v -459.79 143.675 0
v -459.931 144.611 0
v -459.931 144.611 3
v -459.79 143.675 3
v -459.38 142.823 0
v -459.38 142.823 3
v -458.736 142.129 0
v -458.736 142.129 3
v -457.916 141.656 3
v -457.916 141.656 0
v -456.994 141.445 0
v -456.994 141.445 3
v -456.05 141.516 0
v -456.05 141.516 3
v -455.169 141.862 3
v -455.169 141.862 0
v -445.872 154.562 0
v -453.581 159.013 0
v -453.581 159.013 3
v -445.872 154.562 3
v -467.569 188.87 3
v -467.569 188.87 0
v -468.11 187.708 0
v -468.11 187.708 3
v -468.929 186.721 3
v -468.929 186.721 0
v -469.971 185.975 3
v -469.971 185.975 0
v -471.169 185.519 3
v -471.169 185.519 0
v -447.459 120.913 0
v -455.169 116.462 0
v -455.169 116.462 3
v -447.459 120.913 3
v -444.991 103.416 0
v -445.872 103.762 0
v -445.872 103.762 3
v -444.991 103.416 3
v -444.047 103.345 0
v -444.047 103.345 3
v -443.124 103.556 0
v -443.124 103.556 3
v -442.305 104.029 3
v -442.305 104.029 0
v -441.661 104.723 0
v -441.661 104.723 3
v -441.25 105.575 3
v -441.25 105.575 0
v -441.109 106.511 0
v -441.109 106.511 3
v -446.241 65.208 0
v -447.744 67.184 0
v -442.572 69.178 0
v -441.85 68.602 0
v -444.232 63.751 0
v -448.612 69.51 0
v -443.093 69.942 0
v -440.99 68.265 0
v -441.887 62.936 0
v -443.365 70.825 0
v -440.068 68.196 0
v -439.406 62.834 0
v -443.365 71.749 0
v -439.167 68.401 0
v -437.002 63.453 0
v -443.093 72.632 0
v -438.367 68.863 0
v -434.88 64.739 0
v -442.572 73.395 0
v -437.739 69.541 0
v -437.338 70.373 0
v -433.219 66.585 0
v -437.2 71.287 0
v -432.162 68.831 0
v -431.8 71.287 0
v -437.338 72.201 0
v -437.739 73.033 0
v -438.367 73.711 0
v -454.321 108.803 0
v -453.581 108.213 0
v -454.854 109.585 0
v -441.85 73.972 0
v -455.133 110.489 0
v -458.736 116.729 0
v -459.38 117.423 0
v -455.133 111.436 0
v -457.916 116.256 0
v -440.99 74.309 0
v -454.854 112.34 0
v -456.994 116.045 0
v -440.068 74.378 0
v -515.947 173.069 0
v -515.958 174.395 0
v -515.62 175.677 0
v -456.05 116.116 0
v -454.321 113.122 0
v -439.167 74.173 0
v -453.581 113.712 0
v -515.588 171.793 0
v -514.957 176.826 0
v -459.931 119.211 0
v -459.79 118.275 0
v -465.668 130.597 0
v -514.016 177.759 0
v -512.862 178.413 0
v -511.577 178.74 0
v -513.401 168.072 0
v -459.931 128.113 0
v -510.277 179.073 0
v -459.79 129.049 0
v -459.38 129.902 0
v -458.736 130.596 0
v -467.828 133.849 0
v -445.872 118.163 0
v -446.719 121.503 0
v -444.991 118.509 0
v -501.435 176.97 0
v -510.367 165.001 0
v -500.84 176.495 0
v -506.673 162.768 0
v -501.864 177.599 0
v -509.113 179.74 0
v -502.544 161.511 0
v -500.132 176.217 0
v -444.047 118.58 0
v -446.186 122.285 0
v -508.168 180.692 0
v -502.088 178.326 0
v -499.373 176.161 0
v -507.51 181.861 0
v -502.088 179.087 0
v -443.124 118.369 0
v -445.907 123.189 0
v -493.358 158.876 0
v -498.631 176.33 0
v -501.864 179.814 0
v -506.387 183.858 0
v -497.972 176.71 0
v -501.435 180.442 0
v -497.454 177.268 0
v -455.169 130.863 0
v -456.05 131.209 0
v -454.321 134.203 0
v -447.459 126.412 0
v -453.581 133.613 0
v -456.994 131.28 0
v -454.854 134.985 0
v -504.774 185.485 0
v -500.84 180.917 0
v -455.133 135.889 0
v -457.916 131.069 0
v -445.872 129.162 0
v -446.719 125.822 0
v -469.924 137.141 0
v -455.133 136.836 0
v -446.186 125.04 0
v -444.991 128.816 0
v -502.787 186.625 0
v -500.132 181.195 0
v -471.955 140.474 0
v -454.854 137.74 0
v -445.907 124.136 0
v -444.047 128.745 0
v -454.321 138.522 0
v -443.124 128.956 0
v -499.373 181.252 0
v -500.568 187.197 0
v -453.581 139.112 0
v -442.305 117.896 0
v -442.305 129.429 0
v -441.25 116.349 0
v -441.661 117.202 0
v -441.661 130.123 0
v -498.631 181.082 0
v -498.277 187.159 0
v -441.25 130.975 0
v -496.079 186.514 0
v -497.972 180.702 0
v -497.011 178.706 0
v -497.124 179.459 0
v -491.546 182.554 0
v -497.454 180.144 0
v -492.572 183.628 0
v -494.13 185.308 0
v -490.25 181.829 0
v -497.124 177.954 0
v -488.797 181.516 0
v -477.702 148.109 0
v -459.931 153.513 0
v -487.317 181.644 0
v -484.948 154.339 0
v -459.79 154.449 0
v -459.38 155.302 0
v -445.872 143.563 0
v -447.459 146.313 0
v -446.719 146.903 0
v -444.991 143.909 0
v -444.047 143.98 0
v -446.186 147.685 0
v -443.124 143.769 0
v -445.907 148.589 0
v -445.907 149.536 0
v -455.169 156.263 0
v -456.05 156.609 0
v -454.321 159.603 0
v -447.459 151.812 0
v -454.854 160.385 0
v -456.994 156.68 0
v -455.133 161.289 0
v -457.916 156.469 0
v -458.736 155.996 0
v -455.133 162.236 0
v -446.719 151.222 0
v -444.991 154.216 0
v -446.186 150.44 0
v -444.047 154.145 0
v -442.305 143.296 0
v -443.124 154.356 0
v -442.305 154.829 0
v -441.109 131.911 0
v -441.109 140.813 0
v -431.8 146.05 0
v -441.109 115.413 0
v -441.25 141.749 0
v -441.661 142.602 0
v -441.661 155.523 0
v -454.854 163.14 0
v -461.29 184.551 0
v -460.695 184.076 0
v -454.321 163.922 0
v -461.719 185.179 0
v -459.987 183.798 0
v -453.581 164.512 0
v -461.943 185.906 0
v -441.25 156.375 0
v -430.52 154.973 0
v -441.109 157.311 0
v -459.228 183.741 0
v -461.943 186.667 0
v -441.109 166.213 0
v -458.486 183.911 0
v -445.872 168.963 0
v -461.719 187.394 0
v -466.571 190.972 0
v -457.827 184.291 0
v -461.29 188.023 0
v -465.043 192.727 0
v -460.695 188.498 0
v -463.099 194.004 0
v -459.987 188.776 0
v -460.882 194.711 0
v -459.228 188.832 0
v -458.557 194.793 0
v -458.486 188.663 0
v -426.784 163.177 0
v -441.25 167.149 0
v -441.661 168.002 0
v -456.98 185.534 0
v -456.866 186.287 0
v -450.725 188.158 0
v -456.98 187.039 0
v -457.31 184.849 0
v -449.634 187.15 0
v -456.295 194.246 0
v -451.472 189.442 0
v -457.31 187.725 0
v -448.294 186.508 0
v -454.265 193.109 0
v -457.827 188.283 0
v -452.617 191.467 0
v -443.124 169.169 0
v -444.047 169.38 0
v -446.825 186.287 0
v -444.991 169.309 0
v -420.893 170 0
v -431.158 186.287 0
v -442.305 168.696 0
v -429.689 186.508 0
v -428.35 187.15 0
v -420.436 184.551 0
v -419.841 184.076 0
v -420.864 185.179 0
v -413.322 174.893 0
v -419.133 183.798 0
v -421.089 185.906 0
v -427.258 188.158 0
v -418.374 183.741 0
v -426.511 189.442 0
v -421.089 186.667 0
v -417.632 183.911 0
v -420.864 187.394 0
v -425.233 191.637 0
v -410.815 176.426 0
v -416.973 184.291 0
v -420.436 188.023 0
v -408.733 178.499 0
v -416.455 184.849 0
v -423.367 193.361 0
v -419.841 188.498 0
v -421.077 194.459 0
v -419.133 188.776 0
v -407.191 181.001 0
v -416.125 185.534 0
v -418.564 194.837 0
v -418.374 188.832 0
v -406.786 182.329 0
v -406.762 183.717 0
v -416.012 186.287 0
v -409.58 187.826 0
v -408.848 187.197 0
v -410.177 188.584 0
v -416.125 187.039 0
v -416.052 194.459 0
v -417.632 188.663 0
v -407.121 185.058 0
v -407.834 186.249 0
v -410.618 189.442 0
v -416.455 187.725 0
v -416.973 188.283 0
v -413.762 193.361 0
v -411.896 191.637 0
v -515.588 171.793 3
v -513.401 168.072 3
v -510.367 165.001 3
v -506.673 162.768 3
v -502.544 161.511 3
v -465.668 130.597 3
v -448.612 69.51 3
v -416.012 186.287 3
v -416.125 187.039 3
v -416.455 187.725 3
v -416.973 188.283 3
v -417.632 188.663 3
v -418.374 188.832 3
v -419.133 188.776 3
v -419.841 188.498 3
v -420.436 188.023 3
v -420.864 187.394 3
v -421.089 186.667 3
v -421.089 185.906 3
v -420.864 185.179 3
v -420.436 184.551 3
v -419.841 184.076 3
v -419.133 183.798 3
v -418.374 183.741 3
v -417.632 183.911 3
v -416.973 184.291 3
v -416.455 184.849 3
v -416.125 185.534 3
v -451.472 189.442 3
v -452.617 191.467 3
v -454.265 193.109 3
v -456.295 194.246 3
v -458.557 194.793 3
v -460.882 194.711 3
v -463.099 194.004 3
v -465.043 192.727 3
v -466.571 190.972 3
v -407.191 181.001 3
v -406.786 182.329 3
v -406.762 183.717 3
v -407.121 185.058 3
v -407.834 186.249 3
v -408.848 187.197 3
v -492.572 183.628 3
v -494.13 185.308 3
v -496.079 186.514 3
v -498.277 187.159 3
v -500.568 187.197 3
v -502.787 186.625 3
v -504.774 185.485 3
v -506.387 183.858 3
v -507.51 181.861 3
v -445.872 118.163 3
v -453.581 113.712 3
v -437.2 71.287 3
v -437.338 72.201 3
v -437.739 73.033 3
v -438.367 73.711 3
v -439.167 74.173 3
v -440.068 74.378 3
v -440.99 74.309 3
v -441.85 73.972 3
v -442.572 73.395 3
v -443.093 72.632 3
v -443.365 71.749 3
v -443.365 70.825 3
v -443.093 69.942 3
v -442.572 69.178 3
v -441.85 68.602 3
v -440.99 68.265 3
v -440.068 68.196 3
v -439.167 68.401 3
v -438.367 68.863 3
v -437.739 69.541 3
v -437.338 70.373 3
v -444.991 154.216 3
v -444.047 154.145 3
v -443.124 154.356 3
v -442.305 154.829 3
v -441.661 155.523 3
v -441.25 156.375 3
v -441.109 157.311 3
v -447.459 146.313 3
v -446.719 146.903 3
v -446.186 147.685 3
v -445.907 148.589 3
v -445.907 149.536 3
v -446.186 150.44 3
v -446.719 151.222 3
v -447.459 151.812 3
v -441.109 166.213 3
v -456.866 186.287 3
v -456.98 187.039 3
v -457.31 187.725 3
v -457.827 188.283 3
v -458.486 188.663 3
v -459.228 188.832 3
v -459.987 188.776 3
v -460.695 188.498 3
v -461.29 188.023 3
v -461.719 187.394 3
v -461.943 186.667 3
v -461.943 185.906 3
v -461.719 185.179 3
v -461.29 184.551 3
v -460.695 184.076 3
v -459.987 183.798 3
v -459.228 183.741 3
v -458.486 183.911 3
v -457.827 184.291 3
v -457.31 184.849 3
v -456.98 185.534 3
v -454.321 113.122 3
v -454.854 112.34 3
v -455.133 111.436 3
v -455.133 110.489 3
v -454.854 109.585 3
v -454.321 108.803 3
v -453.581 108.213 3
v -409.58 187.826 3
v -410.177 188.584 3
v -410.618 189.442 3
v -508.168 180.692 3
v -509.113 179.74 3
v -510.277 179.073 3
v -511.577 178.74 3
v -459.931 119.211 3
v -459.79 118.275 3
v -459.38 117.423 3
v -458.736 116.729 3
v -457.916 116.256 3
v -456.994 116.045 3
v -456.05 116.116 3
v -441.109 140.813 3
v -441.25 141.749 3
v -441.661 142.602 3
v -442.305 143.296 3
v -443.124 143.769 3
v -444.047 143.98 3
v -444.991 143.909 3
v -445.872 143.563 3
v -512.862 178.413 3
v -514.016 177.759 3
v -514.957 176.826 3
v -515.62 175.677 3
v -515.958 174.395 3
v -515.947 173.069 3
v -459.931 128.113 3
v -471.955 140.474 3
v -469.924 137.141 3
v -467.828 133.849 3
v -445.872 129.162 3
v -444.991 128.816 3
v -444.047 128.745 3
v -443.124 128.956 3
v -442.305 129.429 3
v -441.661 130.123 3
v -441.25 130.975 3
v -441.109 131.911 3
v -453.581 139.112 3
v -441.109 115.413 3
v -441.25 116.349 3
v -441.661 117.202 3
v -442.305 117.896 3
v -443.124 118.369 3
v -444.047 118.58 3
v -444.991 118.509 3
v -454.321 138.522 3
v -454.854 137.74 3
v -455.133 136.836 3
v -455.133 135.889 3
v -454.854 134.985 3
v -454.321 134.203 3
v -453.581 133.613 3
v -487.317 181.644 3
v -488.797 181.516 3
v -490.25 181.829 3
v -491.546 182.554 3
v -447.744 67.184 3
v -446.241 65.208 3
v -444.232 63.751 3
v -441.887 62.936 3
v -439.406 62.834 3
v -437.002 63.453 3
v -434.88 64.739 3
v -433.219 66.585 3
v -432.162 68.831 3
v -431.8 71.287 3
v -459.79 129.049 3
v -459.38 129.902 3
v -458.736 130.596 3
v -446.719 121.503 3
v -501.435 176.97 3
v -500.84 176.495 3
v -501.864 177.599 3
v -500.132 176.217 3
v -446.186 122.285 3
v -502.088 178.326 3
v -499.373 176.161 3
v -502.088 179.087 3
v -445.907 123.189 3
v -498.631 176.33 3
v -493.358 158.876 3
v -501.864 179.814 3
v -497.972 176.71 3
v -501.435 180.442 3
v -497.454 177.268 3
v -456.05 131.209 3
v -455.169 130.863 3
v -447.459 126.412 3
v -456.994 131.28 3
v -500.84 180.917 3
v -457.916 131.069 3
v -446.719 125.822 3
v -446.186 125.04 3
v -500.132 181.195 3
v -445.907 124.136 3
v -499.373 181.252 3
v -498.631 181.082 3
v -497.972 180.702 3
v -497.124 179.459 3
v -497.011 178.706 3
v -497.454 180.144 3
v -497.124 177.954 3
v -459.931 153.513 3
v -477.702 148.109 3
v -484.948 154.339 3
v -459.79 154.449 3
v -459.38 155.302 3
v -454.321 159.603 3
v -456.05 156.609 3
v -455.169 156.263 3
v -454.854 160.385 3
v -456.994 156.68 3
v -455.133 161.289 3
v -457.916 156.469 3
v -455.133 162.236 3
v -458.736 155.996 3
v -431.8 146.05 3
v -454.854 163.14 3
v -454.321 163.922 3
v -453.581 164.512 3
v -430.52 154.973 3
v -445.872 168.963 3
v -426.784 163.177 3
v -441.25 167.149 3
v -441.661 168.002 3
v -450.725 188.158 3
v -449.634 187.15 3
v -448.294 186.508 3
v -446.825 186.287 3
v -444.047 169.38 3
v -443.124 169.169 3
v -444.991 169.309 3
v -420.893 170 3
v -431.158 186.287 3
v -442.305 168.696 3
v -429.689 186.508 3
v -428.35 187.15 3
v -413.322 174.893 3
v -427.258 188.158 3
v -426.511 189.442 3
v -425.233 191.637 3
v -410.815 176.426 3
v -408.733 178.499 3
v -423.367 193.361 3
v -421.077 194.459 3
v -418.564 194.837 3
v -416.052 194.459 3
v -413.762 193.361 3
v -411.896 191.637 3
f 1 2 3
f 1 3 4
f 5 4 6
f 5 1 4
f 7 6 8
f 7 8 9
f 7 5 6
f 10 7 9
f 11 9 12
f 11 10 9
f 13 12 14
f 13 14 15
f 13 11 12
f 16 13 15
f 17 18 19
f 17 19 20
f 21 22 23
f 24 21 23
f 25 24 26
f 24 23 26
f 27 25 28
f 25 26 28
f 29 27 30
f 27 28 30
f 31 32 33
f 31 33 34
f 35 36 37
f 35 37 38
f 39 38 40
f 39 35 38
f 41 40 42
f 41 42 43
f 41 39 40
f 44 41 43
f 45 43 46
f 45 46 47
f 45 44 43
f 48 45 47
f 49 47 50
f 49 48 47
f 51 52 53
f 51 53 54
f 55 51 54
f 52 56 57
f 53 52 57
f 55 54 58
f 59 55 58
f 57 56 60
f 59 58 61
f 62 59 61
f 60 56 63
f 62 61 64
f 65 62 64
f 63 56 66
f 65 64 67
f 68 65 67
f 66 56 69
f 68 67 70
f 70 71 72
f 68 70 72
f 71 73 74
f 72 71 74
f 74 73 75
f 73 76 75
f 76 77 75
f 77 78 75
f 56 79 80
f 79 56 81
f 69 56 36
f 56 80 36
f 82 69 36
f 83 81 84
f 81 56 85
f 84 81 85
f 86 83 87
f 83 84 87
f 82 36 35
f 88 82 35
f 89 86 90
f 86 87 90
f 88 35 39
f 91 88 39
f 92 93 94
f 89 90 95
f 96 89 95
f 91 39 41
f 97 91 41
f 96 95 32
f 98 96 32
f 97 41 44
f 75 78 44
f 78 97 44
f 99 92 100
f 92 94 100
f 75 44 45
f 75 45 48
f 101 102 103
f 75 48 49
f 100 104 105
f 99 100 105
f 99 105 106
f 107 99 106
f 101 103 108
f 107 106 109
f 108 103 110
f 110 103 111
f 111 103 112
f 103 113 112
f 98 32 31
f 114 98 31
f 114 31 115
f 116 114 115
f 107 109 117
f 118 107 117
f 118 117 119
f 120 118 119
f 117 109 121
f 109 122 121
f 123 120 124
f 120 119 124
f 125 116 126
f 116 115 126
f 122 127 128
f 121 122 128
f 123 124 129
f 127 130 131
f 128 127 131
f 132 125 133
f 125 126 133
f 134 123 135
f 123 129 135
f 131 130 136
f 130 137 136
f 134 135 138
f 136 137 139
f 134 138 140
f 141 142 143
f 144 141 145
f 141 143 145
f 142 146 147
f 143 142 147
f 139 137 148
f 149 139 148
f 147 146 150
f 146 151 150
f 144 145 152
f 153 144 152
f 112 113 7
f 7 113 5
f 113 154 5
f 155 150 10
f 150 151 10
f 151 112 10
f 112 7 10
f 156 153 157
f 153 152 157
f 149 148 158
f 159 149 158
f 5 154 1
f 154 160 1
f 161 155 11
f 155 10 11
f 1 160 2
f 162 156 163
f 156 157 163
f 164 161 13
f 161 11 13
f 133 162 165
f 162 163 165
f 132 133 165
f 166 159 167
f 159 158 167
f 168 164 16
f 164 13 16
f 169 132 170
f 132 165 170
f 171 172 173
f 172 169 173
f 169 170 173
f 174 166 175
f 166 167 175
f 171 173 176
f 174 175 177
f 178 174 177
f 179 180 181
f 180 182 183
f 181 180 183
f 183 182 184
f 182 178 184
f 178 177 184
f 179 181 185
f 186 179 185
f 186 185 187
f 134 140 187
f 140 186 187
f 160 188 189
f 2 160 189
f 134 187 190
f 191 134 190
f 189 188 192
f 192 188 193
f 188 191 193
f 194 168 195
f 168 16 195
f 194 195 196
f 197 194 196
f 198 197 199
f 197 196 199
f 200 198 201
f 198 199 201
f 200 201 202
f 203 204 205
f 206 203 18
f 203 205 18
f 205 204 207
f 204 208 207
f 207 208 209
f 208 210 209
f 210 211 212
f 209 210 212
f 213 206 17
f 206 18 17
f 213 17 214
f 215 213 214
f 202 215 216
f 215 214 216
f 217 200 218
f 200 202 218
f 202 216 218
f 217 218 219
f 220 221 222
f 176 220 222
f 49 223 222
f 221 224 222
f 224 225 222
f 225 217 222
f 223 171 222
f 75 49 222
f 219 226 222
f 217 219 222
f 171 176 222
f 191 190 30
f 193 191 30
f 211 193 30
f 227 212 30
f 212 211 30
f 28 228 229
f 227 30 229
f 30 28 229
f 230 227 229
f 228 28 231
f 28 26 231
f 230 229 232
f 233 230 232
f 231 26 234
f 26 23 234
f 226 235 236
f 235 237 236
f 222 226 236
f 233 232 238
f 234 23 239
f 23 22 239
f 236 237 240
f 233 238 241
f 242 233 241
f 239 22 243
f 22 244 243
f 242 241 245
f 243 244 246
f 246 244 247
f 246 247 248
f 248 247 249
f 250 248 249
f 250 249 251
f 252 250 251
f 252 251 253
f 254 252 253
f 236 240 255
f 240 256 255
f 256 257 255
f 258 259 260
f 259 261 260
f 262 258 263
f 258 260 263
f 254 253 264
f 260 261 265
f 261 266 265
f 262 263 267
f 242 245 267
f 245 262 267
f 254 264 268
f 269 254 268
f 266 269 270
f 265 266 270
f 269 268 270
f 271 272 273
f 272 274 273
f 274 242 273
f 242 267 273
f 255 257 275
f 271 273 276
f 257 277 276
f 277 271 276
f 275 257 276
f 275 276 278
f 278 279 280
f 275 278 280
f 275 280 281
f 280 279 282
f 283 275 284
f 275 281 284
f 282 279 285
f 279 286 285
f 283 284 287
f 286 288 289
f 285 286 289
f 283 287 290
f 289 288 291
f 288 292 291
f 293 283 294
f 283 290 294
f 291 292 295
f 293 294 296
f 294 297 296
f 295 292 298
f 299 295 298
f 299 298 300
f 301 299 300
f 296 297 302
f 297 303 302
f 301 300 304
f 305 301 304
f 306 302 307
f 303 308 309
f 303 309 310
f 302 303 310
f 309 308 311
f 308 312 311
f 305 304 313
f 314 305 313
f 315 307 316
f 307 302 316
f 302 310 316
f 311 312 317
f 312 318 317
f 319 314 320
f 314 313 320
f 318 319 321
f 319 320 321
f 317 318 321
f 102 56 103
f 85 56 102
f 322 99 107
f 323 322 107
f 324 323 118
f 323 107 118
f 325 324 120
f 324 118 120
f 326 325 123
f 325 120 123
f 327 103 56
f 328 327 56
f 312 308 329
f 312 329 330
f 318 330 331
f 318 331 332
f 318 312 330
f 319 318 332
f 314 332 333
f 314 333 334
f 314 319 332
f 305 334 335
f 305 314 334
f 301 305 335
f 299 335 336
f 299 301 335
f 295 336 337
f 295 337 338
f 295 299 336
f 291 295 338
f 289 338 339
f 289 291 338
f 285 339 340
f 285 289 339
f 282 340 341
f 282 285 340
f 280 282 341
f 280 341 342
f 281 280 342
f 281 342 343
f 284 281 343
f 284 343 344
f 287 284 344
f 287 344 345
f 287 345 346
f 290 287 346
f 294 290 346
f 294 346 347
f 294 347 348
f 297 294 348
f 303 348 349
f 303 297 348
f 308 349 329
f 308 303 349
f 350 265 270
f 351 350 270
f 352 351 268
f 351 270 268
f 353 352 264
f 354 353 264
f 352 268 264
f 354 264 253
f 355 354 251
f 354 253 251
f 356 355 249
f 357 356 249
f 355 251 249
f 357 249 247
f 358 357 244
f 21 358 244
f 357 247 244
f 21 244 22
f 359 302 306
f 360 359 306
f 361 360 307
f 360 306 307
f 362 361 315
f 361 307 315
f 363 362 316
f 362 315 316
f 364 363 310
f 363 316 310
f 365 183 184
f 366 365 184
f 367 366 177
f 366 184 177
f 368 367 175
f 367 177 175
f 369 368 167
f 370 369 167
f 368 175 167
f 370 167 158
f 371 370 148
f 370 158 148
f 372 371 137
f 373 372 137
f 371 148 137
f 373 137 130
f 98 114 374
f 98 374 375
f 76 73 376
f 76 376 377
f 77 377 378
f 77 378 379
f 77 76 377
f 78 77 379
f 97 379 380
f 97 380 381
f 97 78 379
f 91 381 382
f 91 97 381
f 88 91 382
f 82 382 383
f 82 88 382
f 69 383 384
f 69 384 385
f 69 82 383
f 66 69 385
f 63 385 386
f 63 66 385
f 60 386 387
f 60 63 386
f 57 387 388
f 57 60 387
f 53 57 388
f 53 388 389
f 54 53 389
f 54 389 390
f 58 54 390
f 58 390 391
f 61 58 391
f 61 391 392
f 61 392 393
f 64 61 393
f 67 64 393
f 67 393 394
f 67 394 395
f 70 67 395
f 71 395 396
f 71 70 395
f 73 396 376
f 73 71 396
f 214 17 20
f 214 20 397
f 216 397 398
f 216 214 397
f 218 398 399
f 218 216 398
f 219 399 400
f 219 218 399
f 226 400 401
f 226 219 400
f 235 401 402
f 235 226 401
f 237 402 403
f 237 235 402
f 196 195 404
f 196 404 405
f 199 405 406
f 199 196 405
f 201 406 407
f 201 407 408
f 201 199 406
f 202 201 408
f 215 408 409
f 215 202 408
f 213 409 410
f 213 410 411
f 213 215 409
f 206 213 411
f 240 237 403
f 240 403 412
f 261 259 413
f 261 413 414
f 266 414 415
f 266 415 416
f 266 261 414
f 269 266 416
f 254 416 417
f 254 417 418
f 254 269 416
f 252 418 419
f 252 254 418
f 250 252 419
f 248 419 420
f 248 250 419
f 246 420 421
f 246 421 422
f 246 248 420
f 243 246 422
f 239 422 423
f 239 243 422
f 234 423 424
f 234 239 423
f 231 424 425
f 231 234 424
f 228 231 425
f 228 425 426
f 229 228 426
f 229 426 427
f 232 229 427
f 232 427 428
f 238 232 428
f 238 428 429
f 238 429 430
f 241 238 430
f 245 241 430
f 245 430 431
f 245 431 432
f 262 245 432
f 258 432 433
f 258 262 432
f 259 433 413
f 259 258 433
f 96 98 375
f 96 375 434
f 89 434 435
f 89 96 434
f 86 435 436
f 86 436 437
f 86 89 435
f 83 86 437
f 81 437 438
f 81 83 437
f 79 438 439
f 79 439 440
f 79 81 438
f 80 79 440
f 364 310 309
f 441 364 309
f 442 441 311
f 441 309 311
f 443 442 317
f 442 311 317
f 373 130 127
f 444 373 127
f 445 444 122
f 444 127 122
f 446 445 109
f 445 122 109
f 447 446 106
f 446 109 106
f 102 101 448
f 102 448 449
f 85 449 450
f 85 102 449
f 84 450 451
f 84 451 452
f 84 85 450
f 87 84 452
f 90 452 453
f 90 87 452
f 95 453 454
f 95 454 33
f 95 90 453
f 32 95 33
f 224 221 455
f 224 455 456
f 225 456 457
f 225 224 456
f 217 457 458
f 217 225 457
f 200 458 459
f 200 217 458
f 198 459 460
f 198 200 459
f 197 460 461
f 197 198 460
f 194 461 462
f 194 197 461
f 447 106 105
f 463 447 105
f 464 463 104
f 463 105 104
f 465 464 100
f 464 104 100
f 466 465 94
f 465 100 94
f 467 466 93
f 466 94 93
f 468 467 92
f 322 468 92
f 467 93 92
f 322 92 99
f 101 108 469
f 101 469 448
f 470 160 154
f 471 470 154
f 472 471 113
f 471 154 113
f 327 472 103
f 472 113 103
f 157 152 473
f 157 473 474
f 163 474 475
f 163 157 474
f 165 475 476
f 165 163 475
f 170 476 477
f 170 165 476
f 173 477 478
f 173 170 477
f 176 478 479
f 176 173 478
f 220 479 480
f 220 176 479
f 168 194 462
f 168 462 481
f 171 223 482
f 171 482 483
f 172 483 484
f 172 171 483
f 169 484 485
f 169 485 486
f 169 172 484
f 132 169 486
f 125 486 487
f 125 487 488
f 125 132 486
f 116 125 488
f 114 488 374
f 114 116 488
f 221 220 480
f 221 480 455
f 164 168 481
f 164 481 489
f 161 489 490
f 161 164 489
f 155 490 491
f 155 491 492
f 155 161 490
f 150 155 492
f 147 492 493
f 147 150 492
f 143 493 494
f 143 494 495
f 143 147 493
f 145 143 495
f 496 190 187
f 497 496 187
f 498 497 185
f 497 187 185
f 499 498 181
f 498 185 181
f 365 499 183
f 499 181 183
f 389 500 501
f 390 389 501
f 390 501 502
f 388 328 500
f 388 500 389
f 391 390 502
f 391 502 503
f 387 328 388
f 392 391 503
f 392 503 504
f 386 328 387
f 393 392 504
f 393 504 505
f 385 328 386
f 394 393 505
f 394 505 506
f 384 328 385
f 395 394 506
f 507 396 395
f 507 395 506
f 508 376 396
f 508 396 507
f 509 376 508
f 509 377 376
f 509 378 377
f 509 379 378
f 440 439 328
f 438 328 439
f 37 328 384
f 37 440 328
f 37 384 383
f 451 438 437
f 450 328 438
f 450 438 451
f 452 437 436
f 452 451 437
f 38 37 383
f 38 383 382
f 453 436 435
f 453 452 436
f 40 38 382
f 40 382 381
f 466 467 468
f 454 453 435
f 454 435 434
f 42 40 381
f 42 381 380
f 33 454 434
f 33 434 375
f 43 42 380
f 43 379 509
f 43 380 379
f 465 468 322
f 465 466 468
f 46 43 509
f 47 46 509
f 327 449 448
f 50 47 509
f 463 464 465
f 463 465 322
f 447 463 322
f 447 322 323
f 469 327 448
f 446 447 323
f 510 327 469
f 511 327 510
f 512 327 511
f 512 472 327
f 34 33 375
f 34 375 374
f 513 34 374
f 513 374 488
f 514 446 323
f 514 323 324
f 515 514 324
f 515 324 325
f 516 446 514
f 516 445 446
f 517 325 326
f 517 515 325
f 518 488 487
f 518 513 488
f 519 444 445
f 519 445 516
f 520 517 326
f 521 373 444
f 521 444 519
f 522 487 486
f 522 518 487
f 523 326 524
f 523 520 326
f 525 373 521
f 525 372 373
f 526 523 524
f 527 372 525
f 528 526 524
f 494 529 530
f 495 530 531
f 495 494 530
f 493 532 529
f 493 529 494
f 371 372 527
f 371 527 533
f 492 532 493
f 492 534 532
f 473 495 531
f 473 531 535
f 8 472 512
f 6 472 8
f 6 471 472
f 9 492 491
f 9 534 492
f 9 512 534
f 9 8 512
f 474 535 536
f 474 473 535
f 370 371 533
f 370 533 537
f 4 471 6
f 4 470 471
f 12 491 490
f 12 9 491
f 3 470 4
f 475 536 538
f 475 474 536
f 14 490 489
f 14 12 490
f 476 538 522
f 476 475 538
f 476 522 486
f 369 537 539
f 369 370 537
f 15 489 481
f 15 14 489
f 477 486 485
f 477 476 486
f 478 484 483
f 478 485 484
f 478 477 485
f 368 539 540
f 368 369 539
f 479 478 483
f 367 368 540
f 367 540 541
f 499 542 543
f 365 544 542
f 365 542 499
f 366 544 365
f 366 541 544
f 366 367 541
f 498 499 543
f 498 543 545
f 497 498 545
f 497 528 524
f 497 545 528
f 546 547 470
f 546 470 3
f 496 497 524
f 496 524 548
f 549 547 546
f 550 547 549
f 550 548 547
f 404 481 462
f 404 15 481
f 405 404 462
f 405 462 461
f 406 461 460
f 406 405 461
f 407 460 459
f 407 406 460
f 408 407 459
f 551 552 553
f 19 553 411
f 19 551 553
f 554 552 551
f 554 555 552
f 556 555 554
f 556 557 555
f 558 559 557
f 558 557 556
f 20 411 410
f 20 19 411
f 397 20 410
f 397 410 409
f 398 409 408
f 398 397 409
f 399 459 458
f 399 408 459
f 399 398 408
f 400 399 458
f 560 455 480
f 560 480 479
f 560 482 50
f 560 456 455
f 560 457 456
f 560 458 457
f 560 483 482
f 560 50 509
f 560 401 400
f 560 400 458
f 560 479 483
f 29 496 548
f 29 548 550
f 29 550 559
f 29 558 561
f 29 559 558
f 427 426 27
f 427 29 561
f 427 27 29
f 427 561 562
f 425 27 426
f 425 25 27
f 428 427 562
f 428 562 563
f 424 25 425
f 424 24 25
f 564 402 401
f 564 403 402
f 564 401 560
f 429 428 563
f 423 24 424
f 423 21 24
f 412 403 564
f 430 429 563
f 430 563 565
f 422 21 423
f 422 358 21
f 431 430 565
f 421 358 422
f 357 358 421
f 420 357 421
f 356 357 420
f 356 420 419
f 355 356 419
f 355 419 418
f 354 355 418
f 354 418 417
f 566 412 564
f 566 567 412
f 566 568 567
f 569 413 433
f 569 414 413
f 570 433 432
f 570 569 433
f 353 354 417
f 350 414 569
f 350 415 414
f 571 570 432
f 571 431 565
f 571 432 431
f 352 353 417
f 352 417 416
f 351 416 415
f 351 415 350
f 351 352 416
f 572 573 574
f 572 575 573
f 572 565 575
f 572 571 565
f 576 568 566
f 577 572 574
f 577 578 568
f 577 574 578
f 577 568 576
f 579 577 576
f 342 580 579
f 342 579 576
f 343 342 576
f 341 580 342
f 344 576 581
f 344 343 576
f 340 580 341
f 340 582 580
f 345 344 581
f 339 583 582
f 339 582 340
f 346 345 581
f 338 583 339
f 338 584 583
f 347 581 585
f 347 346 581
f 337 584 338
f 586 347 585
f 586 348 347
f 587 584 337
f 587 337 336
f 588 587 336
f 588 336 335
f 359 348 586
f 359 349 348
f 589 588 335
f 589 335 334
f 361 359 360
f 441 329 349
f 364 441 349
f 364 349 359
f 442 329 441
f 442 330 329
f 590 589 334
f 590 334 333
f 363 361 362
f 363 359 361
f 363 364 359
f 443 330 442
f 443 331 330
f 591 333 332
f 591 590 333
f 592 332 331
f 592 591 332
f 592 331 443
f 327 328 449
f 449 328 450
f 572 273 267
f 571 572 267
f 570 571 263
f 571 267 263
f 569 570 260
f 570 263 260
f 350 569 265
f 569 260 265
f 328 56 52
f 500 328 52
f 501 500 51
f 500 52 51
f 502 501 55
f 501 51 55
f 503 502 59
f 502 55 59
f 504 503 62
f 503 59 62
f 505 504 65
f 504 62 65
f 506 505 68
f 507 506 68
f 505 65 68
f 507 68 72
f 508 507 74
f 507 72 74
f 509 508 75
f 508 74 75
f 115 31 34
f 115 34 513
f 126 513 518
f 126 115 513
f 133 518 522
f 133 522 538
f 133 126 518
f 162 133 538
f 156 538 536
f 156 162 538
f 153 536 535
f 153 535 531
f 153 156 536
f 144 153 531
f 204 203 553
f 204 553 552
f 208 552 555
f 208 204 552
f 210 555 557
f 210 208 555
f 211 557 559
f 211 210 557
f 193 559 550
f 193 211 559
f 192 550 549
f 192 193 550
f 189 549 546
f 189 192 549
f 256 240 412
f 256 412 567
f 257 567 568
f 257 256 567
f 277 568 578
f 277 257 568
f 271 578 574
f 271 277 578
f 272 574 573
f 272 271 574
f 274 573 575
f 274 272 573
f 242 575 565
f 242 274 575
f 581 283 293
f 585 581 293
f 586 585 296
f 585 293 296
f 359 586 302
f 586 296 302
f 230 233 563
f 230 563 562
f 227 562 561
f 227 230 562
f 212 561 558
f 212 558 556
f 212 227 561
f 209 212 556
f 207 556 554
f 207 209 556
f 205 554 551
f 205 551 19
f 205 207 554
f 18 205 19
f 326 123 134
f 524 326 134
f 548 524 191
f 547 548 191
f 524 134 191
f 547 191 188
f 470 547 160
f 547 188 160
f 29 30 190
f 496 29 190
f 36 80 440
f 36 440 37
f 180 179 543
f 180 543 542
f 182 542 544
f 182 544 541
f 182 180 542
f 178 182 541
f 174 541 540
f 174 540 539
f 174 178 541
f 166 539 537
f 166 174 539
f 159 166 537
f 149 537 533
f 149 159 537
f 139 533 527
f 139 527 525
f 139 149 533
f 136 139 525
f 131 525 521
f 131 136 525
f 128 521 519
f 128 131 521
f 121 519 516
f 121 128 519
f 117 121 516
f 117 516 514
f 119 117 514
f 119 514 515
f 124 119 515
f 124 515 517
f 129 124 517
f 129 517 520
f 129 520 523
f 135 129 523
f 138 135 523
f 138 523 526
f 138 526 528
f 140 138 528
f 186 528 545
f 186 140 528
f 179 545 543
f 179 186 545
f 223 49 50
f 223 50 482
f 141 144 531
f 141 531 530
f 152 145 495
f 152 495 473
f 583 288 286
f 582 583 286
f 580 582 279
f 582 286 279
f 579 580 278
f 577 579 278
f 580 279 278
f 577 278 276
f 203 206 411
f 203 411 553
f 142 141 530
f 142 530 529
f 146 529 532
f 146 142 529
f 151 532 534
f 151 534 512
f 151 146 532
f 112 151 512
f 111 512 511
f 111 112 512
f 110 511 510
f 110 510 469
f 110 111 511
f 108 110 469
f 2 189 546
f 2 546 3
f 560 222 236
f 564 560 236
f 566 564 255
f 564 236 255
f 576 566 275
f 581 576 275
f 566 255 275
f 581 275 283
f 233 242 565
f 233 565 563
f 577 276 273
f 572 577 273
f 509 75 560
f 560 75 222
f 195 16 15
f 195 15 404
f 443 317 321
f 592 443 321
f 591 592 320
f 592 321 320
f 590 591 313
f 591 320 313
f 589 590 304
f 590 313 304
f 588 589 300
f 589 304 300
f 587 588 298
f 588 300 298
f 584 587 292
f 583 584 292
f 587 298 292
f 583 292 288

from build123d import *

# Parameters (mm, degrees)
SKETCH_1_R      = 2.5527
SKETCH_1_R_2    = 3.1
EXTRUDE_1_DEPTH = 3


with BuildPart() as part:
    # 草图1 → 凸台-拉伸1 (new body)
    with BuildSketch(Plane.XY):
        with BuildLine():
            Line((-431.8, 71.28685299), (-431.8, 146.05))
            ThreePointArc((-431.8, 146.05), (-426.7842688, 163.177211441), (-413.321803354, 174.893053509))
            ThreePointArc((-413.321803354, 174.893053509), (-409.712819047, 177.401355972), (-407.190786251, 181.000758638))
            ThreePointArc((-407.190786251, 181.000758638), (-406.894729782, 184.399778985), (-408.847840186, 187.197340155))
            ThreePointArc((-408.847840186, 187.197340155), (-409.896638803, 188.190326933), (-410.617854885, 189.441665672))
            ThreePointArc((-410.617854885, 189.441665672), (-418.564439883, 194.83685299), (-426.511139528, 189.44183454))
            ThreePointArc((-426.511139528, 189.44183454), (-428.349818055, 187.150121657), (-431.158279177, 186.28685299))
            Line((-431.158279177, 186.28685299), (-446.825059534, 186.28685299))
            ThreePointArc((-446.825059534, 186.28685299), (-449.633520657, 187.150121657), (-451.472199184, 189.44183454))
            ThreePointArc((-451.472199184, 189.44183454), (-459.722204594, 194.831468283), (-467.569172219, 188.870273751))
            ThreePointArc((-467.569172219, 188.870273751), (-468.928502541, 186.721457004), (-471.168900107, 185.519038159))
            Line((-471.168900107, 185.519038159), (-487.317425816, 181.644437971))
            ThreePointArc((-487.317425816, 181.644437971), (-490.249790032, 181.828630192), (-492.572411279, 183.628107117))
            ThreePointArc((-492.572411279, 183.628107117), (-500.567975463, 187.196951214), (-507.510215673, 181.861129284))
            ThreePointArc((-507.510215673, 181.861129284), (-509.113143283, 179.739691752), (-511.576958731, 178.739948001))
            ThreePointArc((-511.576958731, 178.739948001), (-515.326736937, 176.273665509), (-515.587539859, 171.793111105))
            ThreePointArc((-515.587539859, 171.793111105), (-510.367432741, 165.000898725), (-502.544116189, 161.511001094))
            ThreePointArc((-502.544116189, 161.511001094), (-484.948131906, 154.339092671), (-471.954869788, 140.474386658))
            ThreePointArc((-471.954869788, 140.474386658), (-468.883733752, 135.489867956), (-465.668015362, 130.59737795))
            Line((-465.668015362, 130.59737795), (-448.612101008, 69.509501917))
            ThreePointArc((-448.612101008, 69.509501917), (-439.40637216, 62.833958262), (-431.8, 71.28685299))
        make_face()
        with Locations((-459.418807983, 186.28685299)):
            Circle(SKETCH_1_R, mode=Mode.SUBTRACT)
        with Locations((-418.564530728, 186.28685299)):
            Circle(SKETCH_1_R, mode=Mode.SUBTRACT)
        with Locations((-499.563606874, 178.706147734)):
            Circle(SKETCH_1_R, mode=Mode.SUBTRACT)
        with Locations((-440.3, 71.28685299)):
            Circle(SKETCH_1_R_2, mode=Mode.SUBTRACT)
        with BuildLine():
            Line((-441.1092355, 106.511213318), (-441.1092355, 115.413429376))
            ThreePointArc((-441.1092355, 115.413429376), (-442.6967355, 118.163060033), (-445.8717355, 118.163060033))
            Line((-445.8717355, 118.163060033), (-453.581280756, 113.711952004))
            ThreePointArc((-453.581280756, 113.711952004), (-455.168780756, 110.962321347), (-453.581280756, 108.21269069))
            Line((-453.581280756, 108.21269069), (-445.8717355, 103.761582661))
            ThreePointArc((-445.8717355, 103.761582661), (-442.6967355, 103.761582661), (-441.1092355, 106.511213318))
        make_face(mode=Mode.SUBTRACT)
        with BuildLine():
            Line((-455.168781337, 116.461582661), (-447.459236081, 120.91269069))
            ThreePointArc((-447.459236081, 120.91269069), (-445.871736081, 123.662321347), (-447.459236081, 126.411952004))
            Line((-447.459236081, 126.411952004), (-455.168781337, 130.863060033))
            ThreePointArc((-455.168781337, 130.863060033), (-458.343781337, 130.863060033), (-459.931281337, 128.113429376))
            Line((-459.931281337, 128.113429376), (-459.931281337, 119.211213318))
            ThreePointArc((-459.931281337, 119.211213318), (-458.343781337, 116.461582661), (-455.168781337, 116.461582661))
        make_face(mode=Mode.SUBTRACT)
        with BuildLine():
            Line((-441.1092355, 157.311213318), (-441.1092355, 166.213429376))
            ThreePointArc((-441.1092355, 166.213429376), (-442.6967355, 168.963060033), (-445.8717355, 168.963060033))
            Line((-445.8717355, 168.963060033), (-453.581280756, 164.511952004))
            ThreePointArc((-453.581280756, 164.511952004), (-455.168780756, 161.762321347), (-453.581280756, 159.01269069))
            Line((-453.581280756, 159.01269069), (-445.8717355, 154.561582661))
            ThreePointArc((-445.8717355, 154.561582661), (-442.6967355, 154.561582661), (-441.1092355, 157.311213318))
        make_face(mode=Mode.SUBTRACT)
        with BuildLine():
            Line((-441.1092355, 131.911213318), (-441.1092355, 140.813429376))
            ThreePointArc((-441.1092355, 140.813429376), (-442.6967355, 143.563060033), (-445.8717355, 143.563060033))
            Line((-445.8717355, 143.563060033), (-453.581280756, 139.111952004))
            ThreePointArc((-453.581280756, 139.111952004), (-455.168780756, 136.362321347), (-453.581280756, 133.61269069))
            Line((-453.581280756, 133.61269069), (-445.8717355, 129.161582661))
            ThreePointArc((-445.8717355, 129.161582661), (-442.6967355, 129.161582661), (-441.1092355, 131.911213318))
        make_face(mode=Mode.SUBTRACT)
        with BuildLine():
            Line((-455.168781337, 141.861582661), (-447.459236081, 146.31269069))
            ThreePointArc((-447.459236081, 146.31269069), (-445.871736081, 149.062321347), (-447.459236081, 151.811952004))
            Line((-447.459236081, 151.811952004), (-455.168781337, 156.263060033))
            ThreePointArc((-455.168781337, 156.263060033), (-458.343781337, 156.263060033), (-459.931281337, 153.513429376))
            Line((-459.931281337, 153.513429376), (-459.931281337, 144.611213318))
            ThreePointArc((-459.931281337, 144.611213318), (-458.343781337, 141.861582661), (-455.168781337, 141.861582661))
        make_face(mode=Mode.SUBTRACT)
    extrude(amount=EXTRUDE_1_DEPTH)


solid = part.part
